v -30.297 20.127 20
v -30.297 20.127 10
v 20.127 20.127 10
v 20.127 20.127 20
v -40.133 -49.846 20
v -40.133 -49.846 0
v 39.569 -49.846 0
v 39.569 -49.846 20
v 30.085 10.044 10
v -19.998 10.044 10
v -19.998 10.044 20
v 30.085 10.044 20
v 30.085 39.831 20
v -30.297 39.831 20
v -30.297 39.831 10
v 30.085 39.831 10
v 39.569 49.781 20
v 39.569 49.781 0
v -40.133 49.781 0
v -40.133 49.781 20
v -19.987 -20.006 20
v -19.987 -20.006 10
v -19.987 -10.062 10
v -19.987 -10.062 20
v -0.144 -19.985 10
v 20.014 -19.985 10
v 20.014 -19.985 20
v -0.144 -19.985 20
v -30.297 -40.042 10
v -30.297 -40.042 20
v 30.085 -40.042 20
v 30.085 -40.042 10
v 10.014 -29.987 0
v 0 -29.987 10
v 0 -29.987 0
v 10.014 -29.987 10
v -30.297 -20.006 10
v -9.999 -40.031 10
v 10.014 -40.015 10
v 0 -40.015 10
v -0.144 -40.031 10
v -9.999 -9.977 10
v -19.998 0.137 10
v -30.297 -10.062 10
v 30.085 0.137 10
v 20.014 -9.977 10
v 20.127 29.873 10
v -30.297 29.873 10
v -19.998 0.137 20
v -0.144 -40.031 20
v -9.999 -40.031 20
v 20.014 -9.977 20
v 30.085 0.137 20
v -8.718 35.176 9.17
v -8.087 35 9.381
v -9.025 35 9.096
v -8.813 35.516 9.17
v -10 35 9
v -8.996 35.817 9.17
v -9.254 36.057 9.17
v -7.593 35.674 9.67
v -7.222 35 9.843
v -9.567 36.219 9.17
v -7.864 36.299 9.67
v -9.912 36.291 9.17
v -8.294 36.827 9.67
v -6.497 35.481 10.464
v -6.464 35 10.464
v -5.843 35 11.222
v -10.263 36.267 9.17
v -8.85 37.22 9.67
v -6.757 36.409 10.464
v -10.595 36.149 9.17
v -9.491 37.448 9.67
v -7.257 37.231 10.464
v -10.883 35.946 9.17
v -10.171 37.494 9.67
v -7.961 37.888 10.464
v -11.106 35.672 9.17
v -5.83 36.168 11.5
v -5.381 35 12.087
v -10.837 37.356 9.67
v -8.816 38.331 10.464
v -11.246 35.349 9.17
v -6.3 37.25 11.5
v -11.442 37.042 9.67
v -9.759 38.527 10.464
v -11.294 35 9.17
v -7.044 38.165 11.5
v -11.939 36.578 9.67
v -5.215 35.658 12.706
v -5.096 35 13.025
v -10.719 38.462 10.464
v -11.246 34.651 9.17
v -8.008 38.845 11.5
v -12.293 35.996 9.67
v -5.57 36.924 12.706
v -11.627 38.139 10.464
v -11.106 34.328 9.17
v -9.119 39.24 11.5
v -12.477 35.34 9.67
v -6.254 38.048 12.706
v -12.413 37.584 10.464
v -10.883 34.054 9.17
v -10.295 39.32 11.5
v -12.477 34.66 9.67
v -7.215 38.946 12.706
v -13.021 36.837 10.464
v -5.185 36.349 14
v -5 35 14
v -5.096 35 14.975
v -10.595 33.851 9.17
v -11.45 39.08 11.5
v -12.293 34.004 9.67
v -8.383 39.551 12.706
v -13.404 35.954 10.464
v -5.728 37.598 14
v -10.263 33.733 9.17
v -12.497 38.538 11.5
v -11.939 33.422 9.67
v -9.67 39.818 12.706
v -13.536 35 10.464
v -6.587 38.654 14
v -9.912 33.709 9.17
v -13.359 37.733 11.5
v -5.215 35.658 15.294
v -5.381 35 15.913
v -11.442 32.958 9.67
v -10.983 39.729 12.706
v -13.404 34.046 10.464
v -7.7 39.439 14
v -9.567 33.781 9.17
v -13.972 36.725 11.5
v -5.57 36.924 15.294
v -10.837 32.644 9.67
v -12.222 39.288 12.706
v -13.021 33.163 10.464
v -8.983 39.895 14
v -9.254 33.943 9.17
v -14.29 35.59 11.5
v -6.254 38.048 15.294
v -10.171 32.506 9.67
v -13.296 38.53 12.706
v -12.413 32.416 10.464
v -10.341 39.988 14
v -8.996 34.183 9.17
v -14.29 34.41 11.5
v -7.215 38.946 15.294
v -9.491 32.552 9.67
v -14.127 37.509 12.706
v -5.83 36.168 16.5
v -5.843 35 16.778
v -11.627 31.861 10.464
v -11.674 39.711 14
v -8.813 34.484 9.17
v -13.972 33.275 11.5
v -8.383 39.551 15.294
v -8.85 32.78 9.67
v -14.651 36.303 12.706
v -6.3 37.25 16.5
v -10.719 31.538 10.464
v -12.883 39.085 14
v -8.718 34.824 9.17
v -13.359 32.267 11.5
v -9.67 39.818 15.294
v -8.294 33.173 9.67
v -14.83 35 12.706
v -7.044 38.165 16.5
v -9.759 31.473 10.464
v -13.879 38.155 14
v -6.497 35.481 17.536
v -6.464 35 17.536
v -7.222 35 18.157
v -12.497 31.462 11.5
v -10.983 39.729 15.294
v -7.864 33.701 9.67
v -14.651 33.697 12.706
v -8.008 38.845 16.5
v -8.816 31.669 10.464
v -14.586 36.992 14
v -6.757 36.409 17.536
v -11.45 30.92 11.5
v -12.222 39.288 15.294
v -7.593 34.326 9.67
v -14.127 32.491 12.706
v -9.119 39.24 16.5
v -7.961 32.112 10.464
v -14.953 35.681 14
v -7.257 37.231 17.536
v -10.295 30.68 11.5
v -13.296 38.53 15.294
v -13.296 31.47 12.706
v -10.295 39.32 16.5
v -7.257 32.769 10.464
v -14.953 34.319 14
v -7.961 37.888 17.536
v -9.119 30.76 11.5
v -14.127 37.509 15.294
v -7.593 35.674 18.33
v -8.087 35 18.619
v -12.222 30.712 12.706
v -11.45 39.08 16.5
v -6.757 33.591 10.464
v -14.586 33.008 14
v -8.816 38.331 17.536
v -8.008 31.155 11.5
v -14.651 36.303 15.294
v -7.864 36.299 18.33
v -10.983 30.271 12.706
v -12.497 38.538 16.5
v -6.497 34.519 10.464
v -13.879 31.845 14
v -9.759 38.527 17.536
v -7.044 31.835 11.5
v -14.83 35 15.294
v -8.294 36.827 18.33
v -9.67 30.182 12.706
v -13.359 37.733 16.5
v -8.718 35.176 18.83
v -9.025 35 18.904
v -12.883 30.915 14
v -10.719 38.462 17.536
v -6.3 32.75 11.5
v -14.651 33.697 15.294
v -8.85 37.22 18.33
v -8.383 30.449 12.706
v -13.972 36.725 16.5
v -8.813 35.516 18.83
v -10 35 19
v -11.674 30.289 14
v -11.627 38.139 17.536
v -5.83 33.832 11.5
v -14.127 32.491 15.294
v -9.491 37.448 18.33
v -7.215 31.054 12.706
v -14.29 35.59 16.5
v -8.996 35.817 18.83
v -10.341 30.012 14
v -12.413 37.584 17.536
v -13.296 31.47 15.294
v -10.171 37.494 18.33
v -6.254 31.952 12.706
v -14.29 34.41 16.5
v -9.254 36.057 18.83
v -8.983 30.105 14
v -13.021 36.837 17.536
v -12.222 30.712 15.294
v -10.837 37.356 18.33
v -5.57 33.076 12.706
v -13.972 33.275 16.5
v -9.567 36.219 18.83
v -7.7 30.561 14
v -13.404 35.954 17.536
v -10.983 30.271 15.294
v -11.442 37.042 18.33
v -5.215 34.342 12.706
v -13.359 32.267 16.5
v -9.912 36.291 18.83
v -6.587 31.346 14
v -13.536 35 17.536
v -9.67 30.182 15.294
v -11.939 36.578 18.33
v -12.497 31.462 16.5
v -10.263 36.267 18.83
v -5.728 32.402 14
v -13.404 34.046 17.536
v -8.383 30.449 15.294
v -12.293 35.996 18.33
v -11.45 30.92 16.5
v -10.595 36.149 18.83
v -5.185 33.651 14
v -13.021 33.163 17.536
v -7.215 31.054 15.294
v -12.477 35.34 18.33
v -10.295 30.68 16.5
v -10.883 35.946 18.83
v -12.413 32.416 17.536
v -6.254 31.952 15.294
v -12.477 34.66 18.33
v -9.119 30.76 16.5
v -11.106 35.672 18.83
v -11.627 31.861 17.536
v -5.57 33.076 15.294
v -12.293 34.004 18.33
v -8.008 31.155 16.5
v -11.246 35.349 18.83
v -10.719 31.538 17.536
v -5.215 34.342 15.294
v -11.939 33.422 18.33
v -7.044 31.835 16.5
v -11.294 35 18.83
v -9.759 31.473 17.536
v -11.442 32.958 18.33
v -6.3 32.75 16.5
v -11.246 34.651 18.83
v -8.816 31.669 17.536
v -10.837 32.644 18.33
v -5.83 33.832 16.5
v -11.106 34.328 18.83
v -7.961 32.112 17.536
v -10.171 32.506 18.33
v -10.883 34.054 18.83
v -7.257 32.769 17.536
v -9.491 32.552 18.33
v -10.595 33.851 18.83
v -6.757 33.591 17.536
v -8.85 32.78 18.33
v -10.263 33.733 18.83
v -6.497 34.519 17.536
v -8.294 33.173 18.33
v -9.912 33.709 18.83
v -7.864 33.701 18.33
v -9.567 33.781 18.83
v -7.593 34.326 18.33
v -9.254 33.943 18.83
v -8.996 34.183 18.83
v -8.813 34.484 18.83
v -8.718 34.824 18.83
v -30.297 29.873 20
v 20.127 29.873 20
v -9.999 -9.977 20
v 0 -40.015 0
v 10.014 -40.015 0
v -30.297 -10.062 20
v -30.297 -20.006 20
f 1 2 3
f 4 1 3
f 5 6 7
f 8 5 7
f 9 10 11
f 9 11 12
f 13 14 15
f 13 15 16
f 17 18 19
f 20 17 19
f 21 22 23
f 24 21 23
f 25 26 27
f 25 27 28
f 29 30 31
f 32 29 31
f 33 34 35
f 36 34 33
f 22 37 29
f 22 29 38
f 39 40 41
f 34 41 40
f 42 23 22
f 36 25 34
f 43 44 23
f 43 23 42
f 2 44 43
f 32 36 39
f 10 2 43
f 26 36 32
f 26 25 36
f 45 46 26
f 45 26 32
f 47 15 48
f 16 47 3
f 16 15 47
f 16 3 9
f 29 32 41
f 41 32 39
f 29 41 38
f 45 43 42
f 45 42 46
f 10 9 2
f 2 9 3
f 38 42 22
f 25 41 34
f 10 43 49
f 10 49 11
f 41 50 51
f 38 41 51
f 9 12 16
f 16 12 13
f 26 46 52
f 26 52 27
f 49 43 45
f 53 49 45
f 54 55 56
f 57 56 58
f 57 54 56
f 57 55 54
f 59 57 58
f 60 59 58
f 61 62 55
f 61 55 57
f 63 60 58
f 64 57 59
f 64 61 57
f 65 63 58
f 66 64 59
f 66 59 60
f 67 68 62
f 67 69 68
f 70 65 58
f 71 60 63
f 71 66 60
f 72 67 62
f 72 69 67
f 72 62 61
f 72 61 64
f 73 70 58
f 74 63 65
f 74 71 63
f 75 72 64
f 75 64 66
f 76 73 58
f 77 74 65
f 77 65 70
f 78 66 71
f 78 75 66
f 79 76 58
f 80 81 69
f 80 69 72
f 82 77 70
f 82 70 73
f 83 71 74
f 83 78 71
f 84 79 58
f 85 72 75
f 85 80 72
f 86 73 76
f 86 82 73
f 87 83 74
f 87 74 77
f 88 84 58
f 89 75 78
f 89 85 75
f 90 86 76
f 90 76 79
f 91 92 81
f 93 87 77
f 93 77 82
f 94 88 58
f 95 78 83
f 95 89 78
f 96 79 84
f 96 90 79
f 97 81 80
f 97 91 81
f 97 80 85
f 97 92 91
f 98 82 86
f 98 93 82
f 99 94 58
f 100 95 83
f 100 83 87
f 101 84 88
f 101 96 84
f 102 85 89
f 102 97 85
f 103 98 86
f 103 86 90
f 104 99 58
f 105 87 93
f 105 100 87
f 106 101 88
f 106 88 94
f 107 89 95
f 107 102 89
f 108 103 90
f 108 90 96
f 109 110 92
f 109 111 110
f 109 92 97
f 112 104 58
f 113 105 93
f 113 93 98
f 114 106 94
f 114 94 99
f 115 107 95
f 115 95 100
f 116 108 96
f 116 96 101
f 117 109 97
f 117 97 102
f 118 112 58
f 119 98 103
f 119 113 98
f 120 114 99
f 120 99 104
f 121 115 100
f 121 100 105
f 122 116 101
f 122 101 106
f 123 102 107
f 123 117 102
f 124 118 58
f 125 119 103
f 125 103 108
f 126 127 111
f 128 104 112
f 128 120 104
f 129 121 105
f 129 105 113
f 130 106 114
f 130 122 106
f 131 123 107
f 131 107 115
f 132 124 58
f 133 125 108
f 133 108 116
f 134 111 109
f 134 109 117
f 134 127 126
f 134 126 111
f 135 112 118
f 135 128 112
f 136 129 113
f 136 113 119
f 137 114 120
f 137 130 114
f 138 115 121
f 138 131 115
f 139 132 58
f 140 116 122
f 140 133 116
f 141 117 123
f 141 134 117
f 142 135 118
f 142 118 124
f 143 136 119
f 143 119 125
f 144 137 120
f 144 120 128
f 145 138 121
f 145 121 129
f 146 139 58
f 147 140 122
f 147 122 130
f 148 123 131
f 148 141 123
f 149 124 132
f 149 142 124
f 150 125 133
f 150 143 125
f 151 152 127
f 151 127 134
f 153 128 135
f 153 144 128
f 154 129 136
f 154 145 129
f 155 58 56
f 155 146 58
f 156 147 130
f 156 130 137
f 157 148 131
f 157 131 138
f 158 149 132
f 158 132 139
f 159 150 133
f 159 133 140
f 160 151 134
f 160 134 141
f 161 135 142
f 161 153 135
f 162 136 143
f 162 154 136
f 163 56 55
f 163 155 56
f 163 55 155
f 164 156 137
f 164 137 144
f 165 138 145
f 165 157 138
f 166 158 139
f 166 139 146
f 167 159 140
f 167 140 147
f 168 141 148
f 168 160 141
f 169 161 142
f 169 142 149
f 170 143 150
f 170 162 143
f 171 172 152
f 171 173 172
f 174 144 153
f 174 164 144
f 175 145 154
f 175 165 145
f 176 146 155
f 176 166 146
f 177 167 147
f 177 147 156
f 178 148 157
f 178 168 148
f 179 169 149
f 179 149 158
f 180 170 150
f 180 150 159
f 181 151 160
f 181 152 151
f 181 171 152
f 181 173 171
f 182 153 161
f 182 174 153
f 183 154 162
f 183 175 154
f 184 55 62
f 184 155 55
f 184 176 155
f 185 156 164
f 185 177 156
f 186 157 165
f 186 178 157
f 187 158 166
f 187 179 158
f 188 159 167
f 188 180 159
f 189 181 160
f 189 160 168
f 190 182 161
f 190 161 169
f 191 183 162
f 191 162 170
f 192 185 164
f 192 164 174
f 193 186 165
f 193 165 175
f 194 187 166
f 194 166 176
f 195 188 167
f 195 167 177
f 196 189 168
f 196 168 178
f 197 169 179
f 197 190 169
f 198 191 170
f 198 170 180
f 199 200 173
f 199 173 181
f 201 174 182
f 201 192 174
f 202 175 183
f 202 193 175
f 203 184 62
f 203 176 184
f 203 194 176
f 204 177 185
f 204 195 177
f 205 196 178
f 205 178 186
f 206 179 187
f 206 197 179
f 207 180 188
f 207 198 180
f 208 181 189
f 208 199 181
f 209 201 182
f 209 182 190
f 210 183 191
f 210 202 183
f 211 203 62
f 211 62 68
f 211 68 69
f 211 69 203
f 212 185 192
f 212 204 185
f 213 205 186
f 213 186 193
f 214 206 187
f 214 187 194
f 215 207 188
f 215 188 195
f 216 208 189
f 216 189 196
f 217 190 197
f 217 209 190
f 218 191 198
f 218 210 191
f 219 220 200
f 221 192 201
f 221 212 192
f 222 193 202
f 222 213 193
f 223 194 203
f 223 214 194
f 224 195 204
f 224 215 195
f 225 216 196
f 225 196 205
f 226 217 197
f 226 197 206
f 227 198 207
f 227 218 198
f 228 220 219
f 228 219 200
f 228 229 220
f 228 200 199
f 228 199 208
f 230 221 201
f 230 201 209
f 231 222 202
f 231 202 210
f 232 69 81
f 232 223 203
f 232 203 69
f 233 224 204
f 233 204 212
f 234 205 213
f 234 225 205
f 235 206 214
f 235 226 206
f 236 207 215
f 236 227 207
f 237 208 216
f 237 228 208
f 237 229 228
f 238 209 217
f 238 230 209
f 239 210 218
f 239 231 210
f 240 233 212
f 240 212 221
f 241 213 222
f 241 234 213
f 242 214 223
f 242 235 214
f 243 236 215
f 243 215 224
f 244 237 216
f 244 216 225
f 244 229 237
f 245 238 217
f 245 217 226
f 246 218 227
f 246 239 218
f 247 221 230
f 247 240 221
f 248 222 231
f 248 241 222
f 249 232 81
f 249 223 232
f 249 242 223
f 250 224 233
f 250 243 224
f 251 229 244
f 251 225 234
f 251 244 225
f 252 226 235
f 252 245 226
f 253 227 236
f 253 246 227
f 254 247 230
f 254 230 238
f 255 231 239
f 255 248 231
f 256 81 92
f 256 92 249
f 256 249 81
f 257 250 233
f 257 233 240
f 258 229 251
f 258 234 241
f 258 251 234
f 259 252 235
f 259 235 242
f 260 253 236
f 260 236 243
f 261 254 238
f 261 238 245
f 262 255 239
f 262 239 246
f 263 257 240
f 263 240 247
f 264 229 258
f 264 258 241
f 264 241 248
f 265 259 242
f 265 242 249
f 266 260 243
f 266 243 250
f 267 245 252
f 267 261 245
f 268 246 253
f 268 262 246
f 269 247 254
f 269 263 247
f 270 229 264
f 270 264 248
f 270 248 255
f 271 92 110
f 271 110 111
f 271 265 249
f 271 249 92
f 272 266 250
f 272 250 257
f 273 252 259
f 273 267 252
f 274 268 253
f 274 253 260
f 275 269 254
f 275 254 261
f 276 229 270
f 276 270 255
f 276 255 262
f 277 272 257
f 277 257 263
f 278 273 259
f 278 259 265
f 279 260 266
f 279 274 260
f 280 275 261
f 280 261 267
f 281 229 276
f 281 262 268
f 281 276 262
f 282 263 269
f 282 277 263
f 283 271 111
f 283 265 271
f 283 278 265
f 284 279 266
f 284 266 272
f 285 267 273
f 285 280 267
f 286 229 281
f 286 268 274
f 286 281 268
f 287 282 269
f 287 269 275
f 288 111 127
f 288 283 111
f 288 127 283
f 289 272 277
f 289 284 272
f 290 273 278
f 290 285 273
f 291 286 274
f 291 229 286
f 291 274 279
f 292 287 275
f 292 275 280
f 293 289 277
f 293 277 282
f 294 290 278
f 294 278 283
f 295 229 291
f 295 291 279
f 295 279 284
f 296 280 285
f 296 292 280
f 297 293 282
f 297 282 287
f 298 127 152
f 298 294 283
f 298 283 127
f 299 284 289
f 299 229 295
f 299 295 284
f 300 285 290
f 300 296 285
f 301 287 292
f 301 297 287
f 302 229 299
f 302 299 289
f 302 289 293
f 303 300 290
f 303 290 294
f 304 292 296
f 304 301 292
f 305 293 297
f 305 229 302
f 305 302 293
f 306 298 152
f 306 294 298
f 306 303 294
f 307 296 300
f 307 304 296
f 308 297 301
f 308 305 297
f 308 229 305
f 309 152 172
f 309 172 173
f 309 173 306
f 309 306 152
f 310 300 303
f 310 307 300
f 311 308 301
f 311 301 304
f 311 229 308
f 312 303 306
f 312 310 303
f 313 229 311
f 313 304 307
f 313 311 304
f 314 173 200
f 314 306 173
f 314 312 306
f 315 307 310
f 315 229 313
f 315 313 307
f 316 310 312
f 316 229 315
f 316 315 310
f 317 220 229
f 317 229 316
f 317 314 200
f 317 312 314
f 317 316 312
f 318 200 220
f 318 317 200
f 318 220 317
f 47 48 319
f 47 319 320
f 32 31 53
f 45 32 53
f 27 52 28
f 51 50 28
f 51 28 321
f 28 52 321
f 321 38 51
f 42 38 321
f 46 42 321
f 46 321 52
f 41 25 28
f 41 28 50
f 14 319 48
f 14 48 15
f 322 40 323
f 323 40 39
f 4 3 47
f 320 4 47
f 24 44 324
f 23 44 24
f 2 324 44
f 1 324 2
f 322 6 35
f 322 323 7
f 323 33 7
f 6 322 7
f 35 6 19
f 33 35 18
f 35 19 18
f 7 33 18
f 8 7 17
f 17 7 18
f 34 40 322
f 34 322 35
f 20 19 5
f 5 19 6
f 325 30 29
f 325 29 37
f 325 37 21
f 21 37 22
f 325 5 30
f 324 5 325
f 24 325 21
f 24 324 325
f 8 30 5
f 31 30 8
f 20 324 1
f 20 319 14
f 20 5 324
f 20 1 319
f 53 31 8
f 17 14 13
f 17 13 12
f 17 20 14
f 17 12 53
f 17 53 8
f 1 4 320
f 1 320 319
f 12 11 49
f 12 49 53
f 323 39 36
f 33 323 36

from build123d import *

# Parameters (mm, degrees)
PAD_DEPTH       = 20
SKETCH001_W     = 60.381353
SKETCH001_H     = 79.872879
POCKET_DEPTH    = 10
SKETCH002_W     = 50.635599
SKETCH002_H     = 9.745766
PAD001_DEPTH    = 10
SKETCH003_W     = 50.387052
SKETCH003_H     = 9.907728
PAD002_DEPTH    = 10
SKETCH004_W     = 10.412415
SKETCH004_H     = 9.944111
PAD003_DEPTH    = 10
PAD004_DEPTH    = 10
SKETCH006_W     = 10.014166
SKETCH006_H     = 10.027307
POCKET001_DEPTH = 10.001


with BuildPart() as body:
    # Sketch → Pad (new body)
    with BuildSketch(Plane.XY):
        Polygon((0, 49.781082), (-40.133099, 49.781082), (-40.133099, -49.846046), (39.568607, -49.846046), (39.568607, 49.781082), align=None)
    extrude(amount=PAD_DEPTH)

    # Sketch001 (on Face7 of Pad) → Pocket (cut)
    with BuildSketch(Plane.XY.offset(20)):
        with Locations((-0.105932, -0.105935)):
            Rectangle(SKETCH001_W, SKETCH001_H)
    extrude(amount=-POCKET_DEPTH, mode=Mode.SUBTRACT)

    # Sketch002 (on Face12 of Pocket) → Pad001 (join)
    with BuildSketch(Plane.XY.offset(10)):
        with Locations((-5.190672, 25)):
            Rectangle(SKETCH002_W, SKETCH002_H)
    extrude(amount=PAD001_DEPTH)

    # Sketch003 (on Face15 of Pad001) → Pad002 (join)
    with BuildSketch(Plane.XY.offset(10)):
        with Locations((5.195203, 5.090434)):
            Rectangle(SKETCH003_W, SKETCH003_H)
    extrude(amount=PAD002_DEPTH)

    # Sketch004 (on Face17 of Pad002) → Pad003 (join)
    with BuildSketch(Plane.XY.offset(10)):
        with Locations((-25.193618, -15.03396)):
            Rectangle(SKETCH004_W, SKETCH004_H)
    extrude(amount=PAD003_DEPTH)

    # Sketch005 (on Face19 of Pad003) → Pad004 (join)
    with BuildSketch(Plane.XY.offset(10)):
        Polygon((-9.998922, -40.03088), (-9.998922, -9.9767), (20.014215, -9.9767), (20.014215, -19.984793), (-0.144092, -19.984793), (-0.144092, -40.03088), align=None)
    extrude(amount=PAD004_DEPTH)

    # Sketch006 (on Face19 of Pad004) → Pocket001 (cut, through all)
    with BuildSketch(Plane.XY.offset(10)):
        with Locations((5.007083, -35.001143)):
            Rectangle(SKETCH006_W, SKETCH006_H)
    extrude(amount=-POCKET001_DEPTH, mode=Mode.SUBTRACT)


with BuildPart() as esfera:
    # Sphere → Sphere (revolve)
    with BuildSketch(Plane(origin=(-10, 35, 14), x_dir=(1, 0, 0), z_dir=(0, -1, 0))):
        with BuildLine():
            ThreePointArc((0, -5), (5, 0), (0, 5))
            Line((0, 5), (0, -5))
        make_face()
    revolve(axis=Axis((-10, 35, 14), (0, 0, 1)))


solid = Compound([body.part, esfera.part])
